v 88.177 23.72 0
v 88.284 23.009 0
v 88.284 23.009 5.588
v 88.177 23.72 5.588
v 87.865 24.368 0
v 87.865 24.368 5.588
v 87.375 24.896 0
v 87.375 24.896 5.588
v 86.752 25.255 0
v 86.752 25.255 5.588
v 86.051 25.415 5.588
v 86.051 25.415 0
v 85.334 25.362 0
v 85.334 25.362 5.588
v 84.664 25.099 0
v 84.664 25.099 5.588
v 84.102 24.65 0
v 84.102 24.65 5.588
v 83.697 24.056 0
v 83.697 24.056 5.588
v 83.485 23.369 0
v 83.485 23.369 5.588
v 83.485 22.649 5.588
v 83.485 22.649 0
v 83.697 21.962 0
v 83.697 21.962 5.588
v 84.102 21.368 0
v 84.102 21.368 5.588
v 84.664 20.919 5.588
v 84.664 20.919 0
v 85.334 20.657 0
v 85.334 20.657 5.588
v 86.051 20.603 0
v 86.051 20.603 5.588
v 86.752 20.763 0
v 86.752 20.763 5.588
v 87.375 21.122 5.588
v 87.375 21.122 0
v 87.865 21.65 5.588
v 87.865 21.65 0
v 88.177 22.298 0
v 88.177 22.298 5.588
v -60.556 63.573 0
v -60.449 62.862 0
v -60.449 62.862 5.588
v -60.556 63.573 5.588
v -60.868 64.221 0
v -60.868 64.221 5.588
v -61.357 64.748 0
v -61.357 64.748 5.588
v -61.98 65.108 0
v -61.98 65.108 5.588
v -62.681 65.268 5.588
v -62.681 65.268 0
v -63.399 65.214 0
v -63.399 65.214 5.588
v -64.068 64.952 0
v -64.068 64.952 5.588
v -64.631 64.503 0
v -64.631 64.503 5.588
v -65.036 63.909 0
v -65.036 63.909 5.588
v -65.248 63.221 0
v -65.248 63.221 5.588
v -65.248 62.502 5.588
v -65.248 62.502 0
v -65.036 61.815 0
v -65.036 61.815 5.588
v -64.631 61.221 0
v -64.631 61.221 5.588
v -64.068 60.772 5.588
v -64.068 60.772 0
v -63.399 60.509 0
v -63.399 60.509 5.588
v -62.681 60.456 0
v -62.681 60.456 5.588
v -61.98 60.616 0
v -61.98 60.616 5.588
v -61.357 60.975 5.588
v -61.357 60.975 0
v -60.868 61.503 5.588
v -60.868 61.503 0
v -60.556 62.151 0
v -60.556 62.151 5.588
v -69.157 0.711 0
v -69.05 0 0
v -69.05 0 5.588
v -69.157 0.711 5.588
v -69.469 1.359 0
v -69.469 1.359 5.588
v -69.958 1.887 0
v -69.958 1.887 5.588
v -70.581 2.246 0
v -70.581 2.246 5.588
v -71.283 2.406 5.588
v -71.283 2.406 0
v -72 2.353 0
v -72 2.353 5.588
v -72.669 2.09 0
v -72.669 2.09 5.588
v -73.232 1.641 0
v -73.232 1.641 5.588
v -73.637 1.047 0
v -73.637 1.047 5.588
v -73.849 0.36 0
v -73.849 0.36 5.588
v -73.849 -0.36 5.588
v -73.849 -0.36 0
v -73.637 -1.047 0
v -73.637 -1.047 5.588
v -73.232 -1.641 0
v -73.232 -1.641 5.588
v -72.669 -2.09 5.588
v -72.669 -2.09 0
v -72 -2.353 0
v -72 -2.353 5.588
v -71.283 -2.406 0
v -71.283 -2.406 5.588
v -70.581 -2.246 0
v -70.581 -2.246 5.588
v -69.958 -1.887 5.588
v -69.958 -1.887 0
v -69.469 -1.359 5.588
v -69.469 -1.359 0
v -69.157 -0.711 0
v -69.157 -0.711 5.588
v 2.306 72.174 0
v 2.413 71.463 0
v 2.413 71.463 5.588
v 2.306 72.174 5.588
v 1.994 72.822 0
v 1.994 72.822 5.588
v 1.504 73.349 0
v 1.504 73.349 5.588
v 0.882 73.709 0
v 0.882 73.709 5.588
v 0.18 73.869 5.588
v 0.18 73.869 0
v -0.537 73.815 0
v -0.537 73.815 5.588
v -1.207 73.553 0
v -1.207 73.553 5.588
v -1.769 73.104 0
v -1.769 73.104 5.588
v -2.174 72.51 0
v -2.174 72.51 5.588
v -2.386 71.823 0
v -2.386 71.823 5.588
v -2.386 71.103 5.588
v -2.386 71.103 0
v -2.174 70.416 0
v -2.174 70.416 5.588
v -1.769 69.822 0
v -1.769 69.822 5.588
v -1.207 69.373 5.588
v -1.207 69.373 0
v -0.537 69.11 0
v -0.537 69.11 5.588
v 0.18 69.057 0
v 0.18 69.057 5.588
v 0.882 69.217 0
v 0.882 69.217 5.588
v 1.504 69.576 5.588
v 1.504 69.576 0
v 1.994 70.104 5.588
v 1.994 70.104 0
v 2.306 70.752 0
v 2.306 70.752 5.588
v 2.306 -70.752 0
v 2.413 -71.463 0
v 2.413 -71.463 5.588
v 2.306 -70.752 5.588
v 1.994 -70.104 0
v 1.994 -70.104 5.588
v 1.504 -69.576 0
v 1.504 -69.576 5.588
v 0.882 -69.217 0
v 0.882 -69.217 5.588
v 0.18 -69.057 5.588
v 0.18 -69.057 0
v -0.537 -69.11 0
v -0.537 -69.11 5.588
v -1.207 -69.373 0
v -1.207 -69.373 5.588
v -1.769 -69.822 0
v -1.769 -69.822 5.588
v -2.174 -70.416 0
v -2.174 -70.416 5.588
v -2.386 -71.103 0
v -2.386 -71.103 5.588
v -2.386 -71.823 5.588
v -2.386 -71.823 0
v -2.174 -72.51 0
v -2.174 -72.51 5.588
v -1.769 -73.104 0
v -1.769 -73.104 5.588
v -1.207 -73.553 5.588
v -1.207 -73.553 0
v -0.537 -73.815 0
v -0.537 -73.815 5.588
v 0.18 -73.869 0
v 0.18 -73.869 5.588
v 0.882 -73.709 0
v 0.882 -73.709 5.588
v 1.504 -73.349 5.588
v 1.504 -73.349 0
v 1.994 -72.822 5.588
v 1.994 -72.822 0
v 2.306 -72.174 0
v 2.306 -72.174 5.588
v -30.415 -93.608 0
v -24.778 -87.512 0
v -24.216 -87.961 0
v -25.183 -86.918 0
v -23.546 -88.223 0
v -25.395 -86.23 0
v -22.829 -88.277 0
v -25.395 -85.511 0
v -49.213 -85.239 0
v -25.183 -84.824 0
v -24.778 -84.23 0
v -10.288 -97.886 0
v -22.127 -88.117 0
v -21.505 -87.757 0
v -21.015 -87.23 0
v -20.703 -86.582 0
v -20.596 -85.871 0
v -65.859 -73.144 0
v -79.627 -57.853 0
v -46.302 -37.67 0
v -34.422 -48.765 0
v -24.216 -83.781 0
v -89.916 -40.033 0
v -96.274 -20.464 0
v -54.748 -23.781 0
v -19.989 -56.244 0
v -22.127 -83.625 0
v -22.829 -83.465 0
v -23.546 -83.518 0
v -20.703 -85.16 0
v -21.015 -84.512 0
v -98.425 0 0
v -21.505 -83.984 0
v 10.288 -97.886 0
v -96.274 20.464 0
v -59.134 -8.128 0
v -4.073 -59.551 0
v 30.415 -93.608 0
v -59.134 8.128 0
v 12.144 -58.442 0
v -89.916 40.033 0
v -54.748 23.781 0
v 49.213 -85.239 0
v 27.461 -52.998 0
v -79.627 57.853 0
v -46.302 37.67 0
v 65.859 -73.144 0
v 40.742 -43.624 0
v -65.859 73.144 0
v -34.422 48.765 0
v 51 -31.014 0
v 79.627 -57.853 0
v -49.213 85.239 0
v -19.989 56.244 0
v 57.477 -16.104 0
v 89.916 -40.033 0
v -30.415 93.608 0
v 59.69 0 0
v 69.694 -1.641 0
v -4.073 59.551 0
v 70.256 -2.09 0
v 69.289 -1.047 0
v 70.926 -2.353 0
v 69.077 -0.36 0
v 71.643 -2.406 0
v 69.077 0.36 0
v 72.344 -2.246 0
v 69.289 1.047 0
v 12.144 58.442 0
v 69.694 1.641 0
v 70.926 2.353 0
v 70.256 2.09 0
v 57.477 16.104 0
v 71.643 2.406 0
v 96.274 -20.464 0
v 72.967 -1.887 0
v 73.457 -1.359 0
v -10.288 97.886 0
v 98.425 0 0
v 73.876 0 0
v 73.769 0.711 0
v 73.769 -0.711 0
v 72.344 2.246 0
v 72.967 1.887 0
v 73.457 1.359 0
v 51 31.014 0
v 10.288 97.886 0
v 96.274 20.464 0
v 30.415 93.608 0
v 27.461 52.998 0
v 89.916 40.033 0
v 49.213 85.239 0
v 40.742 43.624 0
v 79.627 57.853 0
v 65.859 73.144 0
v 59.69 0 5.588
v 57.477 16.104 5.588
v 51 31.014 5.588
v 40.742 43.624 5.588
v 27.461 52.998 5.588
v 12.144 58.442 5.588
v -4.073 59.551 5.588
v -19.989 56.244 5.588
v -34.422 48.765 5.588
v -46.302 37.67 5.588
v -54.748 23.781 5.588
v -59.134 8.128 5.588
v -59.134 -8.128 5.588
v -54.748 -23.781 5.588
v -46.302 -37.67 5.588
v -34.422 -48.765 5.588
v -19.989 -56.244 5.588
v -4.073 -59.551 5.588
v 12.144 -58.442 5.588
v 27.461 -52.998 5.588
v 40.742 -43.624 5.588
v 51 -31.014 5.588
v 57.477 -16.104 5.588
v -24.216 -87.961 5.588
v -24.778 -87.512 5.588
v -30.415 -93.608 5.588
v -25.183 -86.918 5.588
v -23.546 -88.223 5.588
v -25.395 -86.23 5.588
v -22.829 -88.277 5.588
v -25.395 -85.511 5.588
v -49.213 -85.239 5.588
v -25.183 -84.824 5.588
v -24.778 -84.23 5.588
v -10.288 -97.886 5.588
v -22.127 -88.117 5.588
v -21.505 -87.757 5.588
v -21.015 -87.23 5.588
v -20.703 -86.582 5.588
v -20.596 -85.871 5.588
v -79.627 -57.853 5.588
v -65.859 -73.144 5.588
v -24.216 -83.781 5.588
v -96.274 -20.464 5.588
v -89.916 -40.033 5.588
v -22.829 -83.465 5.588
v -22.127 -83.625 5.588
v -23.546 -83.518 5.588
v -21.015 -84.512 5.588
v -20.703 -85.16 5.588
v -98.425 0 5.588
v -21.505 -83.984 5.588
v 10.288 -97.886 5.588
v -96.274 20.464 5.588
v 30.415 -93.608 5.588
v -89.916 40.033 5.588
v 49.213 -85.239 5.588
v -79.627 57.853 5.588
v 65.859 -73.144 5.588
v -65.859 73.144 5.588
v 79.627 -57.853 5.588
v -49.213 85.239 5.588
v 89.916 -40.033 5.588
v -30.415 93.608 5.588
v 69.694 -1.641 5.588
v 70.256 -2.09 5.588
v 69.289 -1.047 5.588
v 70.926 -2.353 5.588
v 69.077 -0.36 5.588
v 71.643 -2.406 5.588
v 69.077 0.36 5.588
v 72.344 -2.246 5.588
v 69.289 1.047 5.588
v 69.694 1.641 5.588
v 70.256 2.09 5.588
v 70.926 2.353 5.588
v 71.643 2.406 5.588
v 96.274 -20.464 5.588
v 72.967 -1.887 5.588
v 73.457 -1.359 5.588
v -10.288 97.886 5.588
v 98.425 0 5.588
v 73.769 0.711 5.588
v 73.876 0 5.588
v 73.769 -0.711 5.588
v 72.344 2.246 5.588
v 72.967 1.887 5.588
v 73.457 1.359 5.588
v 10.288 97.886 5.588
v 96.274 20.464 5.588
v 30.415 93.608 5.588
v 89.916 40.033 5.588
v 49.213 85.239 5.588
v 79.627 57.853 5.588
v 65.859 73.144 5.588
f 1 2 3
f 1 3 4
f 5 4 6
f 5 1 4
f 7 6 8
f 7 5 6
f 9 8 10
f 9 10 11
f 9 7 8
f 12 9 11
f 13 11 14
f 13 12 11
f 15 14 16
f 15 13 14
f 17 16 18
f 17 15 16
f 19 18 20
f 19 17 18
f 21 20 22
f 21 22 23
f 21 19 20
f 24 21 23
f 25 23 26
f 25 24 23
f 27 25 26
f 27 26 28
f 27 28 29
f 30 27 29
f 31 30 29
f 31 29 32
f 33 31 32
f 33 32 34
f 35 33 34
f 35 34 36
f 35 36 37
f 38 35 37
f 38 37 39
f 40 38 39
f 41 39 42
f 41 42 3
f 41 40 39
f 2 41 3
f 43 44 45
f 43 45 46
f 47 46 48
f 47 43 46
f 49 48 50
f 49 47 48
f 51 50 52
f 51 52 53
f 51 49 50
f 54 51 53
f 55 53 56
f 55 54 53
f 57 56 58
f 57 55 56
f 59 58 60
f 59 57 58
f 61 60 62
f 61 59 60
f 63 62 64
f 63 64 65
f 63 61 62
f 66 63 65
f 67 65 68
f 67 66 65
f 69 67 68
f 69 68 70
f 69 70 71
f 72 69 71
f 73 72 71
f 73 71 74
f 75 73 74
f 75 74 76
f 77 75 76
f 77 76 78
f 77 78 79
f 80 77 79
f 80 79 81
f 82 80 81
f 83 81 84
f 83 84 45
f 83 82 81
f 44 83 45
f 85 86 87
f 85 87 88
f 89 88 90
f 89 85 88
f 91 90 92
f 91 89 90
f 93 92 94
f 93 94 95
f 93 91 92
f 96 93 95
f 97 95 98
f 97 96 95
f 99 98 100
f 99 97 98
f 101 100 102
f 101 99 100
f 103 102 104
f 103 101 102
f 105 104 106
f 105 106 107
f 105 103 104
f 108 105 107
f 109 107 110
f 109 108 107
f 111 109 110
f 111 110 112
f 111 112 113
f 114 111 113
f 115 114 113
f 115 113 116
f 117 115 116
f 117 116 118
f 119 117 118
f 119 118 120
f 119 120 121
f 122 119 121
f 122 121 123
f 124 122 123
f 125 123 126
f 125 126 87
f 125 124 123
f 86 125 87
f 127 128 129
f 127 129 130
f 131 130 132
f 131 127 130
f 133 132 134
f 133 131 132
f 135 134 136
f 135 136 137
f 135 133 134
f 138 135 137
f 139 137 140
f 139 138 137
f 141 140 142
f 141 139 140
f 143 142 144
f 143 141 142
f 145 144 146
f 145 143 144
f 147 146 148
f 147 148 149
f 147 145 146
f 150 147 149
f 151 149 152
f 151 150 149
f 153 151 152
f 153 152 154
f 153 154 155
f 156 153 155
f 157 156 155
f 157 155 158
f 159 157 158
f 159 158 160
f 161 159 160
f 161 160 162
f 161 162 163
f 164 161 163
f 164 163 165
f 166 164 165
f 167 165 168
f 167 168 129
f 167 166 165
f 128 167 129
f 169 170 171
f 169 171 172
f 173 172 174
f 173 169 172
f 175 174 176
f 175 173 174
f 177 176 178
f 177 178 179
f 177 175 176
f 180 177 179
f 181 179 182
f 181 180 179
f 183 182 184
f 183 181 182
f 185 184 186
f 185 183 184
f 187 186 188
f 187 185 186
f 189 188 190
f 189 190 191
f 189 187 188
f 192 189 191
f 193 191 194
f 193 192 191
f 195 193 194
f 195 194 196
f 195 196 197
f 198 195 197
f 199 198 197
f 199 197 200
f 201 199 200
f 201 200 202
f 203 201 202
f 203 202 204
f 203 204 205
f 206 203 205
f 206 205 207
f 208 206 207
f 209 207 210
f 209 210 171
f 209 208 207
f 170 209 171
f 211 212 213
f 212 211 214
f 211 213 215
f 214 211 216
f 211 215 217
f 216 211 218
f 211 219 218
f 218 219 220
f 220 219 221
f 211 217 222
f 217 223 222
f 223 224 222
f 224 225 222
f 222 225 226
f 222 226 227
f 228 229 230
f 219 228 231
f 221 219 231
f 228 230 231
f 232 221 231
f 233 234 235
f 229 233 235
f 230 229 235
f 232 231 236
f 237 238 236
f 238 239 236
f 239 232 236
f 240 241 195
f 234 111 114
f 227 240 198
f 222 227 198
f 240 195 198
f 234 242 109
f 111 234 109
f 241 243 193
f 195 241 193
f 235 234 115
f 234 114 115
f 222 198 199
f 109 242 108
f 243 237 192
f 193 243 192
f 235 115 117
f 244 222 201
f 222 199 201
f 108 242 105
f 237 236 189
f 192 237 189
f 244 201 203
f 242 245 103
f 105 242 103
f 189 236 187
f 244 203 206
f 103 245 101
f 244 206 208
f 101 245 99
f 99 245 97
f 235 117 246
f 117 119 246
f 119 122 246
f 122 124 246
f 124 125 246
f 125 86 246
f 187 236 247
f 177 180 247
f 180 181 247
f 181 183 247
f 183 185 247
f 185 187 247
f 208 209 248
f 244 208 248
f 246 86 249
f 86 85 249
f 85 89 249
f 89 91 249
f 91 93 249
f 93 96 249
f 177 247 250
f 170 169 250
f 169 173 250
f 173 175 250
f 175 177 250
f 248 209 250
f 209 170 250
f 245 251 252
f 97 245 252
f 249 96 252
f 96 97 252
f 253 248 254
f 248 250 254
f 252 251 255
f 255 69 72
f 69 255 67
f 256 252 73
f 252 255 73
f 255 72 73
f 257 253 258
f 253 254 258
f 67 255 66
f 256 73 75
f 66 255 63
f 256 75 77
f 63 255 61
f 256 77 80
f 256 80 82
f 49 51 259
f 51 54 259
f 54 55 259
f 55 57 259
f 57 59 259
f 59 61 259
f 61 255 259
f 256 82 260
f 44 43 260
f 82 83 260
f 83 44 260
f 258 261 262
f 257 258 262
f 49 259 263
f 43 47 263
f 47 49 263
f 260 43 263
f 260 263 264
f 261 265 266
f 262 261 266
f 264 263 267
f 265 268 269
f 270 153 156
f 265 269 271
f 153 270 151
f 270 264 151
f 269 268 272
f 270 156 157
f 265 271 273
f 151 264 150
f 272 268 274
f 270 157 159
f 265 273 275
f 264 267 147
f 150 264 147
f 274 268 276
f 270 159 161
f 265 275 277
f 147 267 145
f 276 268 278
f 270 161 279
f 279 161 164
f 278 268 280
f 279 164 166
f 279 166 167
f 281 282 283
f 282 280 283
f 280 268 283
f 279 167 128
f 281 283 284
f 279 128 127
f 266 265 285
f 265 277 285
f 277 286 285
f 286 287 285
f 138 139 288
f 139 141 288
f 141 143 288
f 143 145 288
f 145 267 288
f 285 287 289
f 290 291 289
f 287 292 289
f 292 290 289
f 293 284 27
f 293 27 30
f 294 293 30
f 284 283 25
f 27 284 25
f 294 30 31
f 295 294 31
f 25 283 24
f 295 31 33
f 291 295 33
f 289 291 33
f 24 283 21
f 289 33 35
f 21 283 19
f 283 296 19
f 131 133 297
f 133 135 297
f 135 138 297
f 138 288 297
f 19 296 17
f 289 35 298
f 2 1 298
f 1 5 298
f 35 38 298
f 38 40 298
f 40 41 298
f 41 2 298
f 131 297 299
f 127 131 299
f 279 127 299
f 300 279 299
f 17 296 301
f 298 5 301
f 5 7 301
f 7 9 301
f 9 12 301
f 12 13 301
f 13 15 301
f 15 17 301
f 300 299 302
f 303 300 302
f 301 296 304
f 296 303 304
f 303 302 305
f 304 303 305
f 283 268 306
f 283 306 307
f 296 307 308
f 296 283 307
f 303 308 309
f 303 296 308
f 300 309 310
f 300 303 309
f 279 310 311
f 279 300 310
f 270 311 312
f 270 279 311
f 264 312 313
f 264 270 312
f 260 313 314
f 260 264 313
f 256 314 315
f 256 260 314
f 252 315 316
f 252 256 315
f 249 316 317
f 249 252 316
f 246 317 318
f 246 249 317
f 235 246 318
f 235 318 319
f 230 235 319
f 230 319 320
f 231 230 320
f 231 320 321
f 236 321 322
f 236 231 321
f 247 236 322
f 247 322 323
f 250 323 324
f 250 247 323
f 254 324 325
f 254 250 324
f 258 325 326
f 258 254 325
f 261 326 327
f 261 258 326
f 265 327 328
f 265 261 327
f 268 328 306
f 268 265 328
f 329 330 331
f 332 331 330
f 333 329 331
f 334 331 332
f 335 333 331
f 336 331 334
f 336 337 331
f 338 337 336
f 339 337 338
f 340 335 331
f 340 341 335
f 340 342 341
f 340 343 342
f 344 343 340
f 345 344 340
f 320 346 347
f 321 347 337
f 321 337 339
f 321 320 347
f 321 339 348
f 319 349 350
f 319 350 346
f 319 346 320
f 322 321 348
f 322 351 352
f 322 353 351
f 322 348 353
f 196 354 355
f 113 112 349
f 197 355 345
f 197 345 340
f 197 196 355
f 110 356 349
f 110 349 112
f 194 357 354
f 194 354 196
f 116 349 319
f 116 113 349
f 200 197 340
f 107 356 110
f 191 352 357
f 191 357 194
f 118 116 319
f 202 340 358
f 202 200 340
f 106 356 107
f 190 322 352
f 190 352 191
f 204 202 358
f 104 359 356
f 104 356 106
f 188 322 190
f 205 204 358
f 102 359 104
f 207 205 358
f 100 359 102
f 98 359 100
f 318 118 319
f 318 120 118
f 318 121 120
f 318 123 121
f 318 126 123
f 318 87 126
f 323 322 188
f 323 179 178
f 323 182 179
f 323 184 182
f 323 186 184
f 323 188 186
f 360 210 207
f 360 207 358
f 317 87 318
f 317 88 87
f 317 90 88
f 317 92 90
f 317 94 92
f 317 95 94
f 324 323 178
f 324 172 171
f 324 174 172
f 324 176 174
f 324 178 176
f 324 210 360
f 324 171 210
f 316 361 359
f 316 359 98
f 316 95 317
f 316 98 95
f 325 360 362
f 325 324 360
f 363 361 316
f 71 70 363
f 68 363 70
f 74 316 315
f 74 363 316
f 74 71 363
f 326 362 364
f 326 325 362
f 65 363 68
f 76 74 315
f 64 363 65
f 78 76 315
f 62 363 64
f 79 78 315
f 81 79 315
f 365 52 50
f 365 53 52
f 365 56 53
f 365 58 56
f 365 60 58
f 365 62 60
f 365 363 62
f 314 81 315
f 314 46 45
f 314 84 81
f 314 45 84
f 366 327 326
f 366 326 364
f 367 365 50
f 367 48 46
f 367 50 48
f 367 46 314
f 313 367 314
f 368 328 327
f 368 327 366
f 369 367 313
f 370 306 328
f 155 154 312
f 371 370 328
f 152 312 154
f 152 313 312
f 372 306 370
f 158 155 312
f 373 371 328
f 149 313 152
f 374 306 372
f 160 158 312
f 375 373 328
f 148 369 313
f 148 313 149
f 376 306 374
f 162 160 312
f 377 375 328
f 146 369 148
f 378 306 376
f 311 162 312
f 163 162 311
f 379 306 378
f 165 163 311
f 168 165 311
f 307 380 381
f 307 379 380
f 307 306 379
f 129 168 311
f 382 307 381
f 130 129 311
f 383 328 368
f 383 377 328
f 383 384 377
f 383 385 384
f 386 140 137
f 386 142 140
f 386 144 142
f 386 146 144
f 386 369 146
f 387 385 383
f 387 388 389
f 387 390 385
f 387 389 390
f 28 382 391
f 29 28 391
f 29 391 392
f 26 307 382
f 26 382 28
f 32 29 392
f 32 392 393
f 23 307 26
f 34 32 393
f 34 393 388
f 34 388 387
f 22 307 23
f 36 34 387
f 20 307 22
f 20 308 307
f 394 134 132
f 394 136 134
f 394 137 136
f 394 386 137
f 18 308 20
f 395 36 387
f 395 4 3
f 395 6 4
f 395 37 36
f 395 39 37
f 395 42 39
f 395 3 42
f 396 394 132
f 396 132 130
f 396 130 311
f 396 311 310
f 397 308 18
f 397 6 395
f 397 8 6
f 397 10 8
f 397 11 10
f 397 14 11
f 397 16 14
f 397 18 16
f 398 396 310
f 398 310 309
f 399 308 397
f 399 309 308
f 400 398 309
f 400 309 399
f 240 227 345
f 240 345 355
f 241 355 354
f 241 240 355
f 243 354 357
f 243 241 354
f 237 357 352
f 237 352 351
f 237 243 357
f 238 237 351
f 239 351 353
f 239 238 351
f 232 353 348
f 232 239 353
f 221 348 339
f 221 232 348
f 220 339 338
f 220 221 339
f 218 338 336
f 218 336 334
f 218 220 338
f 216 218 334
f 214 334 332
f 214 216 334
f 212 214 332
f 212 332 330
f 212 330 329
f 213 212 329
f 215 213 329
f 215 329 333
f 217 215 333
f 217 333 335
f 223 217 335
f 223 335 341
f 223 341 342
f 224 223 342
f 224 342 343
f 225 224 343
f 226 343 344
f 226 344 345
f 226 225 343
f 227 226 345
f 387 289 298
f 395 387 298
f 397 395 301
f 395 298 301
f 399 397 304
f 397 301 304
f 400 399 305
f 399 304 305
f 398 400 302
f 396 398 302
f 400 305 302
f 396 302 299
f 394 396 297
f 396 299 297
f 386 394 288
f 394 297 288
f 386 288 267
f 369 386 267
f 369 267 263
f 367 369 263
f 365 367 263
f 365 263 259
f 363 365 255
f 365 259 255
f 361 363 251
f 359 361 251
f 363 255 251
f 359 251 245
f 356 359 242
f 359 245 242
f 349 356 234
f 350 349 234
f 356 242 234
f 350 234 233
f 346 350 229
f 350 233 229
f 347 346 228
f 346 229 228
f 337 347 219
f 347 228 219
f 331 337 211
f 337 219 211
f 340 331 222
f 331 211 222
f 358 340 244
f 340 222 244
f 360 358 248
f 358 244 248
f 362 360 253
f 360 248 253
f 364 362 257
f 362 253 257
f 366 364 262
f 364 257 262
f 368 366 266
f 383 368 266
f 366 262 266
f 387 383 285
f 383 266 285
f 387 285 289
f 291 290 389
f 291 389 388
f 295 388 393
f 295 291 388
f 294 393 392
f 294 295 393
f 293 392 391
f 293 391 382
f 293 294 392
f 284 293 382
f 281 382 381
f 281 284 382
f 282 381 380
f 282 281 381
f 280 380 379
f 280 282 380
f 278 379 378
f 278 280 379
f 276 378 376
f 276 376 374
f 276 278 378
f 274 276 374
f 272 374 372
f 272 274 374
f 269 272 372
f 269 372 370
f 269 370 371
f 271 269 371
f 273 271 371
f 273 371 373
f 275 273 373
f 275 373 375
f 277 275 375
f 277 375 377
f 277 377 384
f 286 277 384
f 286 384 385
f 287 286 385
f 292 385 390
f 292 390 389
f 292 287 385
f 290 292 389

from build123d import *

# Parameters (mm, degrees)
F0_R     = 98.425
F0_R_2   = 2.413
F0_R_3   = 59.69
F1_DEPTH = 5.588


with BuildPart() as f1:
    # F0 (on Top) → F1 (new body)
    with BuildSketch(Plane.XY):
        Circle(F0_R)
        with Locations((-23.009013, -85.870806)):
            Circle(F0_R_2, mode=Mode.SUBTRACT)
        with Locations((0, -71.4629)):
            Circle(F0_R_2, mode=Mode.SUBTRACT)
        with Locations((-71.4629, 0)):
            Circle(F0_R_2, mode=Mode.SUBTRACT)
        with Locations((-62.861793, 62.861793)):
            Circle(F0_R_2, mode=Mode.SUBTRACT)
        Circle(F0_R_3, mode=Mode.SUBTRACT)
        with Locations((71.4629, 0)):
            Circle(F0_R_2, mode=Mode.SUBTRACT)
        with Locations((85.870806, 23.009013)):
            Circle(F0_R_2, mode=Mode.SUBTRACT)
        with Locations((0, 71.4629)):
            Circle(F0_R_2, mode=Mode.SUBTRACT)
    extrude(amount=F1_DEPTH)


solid = f1.part
